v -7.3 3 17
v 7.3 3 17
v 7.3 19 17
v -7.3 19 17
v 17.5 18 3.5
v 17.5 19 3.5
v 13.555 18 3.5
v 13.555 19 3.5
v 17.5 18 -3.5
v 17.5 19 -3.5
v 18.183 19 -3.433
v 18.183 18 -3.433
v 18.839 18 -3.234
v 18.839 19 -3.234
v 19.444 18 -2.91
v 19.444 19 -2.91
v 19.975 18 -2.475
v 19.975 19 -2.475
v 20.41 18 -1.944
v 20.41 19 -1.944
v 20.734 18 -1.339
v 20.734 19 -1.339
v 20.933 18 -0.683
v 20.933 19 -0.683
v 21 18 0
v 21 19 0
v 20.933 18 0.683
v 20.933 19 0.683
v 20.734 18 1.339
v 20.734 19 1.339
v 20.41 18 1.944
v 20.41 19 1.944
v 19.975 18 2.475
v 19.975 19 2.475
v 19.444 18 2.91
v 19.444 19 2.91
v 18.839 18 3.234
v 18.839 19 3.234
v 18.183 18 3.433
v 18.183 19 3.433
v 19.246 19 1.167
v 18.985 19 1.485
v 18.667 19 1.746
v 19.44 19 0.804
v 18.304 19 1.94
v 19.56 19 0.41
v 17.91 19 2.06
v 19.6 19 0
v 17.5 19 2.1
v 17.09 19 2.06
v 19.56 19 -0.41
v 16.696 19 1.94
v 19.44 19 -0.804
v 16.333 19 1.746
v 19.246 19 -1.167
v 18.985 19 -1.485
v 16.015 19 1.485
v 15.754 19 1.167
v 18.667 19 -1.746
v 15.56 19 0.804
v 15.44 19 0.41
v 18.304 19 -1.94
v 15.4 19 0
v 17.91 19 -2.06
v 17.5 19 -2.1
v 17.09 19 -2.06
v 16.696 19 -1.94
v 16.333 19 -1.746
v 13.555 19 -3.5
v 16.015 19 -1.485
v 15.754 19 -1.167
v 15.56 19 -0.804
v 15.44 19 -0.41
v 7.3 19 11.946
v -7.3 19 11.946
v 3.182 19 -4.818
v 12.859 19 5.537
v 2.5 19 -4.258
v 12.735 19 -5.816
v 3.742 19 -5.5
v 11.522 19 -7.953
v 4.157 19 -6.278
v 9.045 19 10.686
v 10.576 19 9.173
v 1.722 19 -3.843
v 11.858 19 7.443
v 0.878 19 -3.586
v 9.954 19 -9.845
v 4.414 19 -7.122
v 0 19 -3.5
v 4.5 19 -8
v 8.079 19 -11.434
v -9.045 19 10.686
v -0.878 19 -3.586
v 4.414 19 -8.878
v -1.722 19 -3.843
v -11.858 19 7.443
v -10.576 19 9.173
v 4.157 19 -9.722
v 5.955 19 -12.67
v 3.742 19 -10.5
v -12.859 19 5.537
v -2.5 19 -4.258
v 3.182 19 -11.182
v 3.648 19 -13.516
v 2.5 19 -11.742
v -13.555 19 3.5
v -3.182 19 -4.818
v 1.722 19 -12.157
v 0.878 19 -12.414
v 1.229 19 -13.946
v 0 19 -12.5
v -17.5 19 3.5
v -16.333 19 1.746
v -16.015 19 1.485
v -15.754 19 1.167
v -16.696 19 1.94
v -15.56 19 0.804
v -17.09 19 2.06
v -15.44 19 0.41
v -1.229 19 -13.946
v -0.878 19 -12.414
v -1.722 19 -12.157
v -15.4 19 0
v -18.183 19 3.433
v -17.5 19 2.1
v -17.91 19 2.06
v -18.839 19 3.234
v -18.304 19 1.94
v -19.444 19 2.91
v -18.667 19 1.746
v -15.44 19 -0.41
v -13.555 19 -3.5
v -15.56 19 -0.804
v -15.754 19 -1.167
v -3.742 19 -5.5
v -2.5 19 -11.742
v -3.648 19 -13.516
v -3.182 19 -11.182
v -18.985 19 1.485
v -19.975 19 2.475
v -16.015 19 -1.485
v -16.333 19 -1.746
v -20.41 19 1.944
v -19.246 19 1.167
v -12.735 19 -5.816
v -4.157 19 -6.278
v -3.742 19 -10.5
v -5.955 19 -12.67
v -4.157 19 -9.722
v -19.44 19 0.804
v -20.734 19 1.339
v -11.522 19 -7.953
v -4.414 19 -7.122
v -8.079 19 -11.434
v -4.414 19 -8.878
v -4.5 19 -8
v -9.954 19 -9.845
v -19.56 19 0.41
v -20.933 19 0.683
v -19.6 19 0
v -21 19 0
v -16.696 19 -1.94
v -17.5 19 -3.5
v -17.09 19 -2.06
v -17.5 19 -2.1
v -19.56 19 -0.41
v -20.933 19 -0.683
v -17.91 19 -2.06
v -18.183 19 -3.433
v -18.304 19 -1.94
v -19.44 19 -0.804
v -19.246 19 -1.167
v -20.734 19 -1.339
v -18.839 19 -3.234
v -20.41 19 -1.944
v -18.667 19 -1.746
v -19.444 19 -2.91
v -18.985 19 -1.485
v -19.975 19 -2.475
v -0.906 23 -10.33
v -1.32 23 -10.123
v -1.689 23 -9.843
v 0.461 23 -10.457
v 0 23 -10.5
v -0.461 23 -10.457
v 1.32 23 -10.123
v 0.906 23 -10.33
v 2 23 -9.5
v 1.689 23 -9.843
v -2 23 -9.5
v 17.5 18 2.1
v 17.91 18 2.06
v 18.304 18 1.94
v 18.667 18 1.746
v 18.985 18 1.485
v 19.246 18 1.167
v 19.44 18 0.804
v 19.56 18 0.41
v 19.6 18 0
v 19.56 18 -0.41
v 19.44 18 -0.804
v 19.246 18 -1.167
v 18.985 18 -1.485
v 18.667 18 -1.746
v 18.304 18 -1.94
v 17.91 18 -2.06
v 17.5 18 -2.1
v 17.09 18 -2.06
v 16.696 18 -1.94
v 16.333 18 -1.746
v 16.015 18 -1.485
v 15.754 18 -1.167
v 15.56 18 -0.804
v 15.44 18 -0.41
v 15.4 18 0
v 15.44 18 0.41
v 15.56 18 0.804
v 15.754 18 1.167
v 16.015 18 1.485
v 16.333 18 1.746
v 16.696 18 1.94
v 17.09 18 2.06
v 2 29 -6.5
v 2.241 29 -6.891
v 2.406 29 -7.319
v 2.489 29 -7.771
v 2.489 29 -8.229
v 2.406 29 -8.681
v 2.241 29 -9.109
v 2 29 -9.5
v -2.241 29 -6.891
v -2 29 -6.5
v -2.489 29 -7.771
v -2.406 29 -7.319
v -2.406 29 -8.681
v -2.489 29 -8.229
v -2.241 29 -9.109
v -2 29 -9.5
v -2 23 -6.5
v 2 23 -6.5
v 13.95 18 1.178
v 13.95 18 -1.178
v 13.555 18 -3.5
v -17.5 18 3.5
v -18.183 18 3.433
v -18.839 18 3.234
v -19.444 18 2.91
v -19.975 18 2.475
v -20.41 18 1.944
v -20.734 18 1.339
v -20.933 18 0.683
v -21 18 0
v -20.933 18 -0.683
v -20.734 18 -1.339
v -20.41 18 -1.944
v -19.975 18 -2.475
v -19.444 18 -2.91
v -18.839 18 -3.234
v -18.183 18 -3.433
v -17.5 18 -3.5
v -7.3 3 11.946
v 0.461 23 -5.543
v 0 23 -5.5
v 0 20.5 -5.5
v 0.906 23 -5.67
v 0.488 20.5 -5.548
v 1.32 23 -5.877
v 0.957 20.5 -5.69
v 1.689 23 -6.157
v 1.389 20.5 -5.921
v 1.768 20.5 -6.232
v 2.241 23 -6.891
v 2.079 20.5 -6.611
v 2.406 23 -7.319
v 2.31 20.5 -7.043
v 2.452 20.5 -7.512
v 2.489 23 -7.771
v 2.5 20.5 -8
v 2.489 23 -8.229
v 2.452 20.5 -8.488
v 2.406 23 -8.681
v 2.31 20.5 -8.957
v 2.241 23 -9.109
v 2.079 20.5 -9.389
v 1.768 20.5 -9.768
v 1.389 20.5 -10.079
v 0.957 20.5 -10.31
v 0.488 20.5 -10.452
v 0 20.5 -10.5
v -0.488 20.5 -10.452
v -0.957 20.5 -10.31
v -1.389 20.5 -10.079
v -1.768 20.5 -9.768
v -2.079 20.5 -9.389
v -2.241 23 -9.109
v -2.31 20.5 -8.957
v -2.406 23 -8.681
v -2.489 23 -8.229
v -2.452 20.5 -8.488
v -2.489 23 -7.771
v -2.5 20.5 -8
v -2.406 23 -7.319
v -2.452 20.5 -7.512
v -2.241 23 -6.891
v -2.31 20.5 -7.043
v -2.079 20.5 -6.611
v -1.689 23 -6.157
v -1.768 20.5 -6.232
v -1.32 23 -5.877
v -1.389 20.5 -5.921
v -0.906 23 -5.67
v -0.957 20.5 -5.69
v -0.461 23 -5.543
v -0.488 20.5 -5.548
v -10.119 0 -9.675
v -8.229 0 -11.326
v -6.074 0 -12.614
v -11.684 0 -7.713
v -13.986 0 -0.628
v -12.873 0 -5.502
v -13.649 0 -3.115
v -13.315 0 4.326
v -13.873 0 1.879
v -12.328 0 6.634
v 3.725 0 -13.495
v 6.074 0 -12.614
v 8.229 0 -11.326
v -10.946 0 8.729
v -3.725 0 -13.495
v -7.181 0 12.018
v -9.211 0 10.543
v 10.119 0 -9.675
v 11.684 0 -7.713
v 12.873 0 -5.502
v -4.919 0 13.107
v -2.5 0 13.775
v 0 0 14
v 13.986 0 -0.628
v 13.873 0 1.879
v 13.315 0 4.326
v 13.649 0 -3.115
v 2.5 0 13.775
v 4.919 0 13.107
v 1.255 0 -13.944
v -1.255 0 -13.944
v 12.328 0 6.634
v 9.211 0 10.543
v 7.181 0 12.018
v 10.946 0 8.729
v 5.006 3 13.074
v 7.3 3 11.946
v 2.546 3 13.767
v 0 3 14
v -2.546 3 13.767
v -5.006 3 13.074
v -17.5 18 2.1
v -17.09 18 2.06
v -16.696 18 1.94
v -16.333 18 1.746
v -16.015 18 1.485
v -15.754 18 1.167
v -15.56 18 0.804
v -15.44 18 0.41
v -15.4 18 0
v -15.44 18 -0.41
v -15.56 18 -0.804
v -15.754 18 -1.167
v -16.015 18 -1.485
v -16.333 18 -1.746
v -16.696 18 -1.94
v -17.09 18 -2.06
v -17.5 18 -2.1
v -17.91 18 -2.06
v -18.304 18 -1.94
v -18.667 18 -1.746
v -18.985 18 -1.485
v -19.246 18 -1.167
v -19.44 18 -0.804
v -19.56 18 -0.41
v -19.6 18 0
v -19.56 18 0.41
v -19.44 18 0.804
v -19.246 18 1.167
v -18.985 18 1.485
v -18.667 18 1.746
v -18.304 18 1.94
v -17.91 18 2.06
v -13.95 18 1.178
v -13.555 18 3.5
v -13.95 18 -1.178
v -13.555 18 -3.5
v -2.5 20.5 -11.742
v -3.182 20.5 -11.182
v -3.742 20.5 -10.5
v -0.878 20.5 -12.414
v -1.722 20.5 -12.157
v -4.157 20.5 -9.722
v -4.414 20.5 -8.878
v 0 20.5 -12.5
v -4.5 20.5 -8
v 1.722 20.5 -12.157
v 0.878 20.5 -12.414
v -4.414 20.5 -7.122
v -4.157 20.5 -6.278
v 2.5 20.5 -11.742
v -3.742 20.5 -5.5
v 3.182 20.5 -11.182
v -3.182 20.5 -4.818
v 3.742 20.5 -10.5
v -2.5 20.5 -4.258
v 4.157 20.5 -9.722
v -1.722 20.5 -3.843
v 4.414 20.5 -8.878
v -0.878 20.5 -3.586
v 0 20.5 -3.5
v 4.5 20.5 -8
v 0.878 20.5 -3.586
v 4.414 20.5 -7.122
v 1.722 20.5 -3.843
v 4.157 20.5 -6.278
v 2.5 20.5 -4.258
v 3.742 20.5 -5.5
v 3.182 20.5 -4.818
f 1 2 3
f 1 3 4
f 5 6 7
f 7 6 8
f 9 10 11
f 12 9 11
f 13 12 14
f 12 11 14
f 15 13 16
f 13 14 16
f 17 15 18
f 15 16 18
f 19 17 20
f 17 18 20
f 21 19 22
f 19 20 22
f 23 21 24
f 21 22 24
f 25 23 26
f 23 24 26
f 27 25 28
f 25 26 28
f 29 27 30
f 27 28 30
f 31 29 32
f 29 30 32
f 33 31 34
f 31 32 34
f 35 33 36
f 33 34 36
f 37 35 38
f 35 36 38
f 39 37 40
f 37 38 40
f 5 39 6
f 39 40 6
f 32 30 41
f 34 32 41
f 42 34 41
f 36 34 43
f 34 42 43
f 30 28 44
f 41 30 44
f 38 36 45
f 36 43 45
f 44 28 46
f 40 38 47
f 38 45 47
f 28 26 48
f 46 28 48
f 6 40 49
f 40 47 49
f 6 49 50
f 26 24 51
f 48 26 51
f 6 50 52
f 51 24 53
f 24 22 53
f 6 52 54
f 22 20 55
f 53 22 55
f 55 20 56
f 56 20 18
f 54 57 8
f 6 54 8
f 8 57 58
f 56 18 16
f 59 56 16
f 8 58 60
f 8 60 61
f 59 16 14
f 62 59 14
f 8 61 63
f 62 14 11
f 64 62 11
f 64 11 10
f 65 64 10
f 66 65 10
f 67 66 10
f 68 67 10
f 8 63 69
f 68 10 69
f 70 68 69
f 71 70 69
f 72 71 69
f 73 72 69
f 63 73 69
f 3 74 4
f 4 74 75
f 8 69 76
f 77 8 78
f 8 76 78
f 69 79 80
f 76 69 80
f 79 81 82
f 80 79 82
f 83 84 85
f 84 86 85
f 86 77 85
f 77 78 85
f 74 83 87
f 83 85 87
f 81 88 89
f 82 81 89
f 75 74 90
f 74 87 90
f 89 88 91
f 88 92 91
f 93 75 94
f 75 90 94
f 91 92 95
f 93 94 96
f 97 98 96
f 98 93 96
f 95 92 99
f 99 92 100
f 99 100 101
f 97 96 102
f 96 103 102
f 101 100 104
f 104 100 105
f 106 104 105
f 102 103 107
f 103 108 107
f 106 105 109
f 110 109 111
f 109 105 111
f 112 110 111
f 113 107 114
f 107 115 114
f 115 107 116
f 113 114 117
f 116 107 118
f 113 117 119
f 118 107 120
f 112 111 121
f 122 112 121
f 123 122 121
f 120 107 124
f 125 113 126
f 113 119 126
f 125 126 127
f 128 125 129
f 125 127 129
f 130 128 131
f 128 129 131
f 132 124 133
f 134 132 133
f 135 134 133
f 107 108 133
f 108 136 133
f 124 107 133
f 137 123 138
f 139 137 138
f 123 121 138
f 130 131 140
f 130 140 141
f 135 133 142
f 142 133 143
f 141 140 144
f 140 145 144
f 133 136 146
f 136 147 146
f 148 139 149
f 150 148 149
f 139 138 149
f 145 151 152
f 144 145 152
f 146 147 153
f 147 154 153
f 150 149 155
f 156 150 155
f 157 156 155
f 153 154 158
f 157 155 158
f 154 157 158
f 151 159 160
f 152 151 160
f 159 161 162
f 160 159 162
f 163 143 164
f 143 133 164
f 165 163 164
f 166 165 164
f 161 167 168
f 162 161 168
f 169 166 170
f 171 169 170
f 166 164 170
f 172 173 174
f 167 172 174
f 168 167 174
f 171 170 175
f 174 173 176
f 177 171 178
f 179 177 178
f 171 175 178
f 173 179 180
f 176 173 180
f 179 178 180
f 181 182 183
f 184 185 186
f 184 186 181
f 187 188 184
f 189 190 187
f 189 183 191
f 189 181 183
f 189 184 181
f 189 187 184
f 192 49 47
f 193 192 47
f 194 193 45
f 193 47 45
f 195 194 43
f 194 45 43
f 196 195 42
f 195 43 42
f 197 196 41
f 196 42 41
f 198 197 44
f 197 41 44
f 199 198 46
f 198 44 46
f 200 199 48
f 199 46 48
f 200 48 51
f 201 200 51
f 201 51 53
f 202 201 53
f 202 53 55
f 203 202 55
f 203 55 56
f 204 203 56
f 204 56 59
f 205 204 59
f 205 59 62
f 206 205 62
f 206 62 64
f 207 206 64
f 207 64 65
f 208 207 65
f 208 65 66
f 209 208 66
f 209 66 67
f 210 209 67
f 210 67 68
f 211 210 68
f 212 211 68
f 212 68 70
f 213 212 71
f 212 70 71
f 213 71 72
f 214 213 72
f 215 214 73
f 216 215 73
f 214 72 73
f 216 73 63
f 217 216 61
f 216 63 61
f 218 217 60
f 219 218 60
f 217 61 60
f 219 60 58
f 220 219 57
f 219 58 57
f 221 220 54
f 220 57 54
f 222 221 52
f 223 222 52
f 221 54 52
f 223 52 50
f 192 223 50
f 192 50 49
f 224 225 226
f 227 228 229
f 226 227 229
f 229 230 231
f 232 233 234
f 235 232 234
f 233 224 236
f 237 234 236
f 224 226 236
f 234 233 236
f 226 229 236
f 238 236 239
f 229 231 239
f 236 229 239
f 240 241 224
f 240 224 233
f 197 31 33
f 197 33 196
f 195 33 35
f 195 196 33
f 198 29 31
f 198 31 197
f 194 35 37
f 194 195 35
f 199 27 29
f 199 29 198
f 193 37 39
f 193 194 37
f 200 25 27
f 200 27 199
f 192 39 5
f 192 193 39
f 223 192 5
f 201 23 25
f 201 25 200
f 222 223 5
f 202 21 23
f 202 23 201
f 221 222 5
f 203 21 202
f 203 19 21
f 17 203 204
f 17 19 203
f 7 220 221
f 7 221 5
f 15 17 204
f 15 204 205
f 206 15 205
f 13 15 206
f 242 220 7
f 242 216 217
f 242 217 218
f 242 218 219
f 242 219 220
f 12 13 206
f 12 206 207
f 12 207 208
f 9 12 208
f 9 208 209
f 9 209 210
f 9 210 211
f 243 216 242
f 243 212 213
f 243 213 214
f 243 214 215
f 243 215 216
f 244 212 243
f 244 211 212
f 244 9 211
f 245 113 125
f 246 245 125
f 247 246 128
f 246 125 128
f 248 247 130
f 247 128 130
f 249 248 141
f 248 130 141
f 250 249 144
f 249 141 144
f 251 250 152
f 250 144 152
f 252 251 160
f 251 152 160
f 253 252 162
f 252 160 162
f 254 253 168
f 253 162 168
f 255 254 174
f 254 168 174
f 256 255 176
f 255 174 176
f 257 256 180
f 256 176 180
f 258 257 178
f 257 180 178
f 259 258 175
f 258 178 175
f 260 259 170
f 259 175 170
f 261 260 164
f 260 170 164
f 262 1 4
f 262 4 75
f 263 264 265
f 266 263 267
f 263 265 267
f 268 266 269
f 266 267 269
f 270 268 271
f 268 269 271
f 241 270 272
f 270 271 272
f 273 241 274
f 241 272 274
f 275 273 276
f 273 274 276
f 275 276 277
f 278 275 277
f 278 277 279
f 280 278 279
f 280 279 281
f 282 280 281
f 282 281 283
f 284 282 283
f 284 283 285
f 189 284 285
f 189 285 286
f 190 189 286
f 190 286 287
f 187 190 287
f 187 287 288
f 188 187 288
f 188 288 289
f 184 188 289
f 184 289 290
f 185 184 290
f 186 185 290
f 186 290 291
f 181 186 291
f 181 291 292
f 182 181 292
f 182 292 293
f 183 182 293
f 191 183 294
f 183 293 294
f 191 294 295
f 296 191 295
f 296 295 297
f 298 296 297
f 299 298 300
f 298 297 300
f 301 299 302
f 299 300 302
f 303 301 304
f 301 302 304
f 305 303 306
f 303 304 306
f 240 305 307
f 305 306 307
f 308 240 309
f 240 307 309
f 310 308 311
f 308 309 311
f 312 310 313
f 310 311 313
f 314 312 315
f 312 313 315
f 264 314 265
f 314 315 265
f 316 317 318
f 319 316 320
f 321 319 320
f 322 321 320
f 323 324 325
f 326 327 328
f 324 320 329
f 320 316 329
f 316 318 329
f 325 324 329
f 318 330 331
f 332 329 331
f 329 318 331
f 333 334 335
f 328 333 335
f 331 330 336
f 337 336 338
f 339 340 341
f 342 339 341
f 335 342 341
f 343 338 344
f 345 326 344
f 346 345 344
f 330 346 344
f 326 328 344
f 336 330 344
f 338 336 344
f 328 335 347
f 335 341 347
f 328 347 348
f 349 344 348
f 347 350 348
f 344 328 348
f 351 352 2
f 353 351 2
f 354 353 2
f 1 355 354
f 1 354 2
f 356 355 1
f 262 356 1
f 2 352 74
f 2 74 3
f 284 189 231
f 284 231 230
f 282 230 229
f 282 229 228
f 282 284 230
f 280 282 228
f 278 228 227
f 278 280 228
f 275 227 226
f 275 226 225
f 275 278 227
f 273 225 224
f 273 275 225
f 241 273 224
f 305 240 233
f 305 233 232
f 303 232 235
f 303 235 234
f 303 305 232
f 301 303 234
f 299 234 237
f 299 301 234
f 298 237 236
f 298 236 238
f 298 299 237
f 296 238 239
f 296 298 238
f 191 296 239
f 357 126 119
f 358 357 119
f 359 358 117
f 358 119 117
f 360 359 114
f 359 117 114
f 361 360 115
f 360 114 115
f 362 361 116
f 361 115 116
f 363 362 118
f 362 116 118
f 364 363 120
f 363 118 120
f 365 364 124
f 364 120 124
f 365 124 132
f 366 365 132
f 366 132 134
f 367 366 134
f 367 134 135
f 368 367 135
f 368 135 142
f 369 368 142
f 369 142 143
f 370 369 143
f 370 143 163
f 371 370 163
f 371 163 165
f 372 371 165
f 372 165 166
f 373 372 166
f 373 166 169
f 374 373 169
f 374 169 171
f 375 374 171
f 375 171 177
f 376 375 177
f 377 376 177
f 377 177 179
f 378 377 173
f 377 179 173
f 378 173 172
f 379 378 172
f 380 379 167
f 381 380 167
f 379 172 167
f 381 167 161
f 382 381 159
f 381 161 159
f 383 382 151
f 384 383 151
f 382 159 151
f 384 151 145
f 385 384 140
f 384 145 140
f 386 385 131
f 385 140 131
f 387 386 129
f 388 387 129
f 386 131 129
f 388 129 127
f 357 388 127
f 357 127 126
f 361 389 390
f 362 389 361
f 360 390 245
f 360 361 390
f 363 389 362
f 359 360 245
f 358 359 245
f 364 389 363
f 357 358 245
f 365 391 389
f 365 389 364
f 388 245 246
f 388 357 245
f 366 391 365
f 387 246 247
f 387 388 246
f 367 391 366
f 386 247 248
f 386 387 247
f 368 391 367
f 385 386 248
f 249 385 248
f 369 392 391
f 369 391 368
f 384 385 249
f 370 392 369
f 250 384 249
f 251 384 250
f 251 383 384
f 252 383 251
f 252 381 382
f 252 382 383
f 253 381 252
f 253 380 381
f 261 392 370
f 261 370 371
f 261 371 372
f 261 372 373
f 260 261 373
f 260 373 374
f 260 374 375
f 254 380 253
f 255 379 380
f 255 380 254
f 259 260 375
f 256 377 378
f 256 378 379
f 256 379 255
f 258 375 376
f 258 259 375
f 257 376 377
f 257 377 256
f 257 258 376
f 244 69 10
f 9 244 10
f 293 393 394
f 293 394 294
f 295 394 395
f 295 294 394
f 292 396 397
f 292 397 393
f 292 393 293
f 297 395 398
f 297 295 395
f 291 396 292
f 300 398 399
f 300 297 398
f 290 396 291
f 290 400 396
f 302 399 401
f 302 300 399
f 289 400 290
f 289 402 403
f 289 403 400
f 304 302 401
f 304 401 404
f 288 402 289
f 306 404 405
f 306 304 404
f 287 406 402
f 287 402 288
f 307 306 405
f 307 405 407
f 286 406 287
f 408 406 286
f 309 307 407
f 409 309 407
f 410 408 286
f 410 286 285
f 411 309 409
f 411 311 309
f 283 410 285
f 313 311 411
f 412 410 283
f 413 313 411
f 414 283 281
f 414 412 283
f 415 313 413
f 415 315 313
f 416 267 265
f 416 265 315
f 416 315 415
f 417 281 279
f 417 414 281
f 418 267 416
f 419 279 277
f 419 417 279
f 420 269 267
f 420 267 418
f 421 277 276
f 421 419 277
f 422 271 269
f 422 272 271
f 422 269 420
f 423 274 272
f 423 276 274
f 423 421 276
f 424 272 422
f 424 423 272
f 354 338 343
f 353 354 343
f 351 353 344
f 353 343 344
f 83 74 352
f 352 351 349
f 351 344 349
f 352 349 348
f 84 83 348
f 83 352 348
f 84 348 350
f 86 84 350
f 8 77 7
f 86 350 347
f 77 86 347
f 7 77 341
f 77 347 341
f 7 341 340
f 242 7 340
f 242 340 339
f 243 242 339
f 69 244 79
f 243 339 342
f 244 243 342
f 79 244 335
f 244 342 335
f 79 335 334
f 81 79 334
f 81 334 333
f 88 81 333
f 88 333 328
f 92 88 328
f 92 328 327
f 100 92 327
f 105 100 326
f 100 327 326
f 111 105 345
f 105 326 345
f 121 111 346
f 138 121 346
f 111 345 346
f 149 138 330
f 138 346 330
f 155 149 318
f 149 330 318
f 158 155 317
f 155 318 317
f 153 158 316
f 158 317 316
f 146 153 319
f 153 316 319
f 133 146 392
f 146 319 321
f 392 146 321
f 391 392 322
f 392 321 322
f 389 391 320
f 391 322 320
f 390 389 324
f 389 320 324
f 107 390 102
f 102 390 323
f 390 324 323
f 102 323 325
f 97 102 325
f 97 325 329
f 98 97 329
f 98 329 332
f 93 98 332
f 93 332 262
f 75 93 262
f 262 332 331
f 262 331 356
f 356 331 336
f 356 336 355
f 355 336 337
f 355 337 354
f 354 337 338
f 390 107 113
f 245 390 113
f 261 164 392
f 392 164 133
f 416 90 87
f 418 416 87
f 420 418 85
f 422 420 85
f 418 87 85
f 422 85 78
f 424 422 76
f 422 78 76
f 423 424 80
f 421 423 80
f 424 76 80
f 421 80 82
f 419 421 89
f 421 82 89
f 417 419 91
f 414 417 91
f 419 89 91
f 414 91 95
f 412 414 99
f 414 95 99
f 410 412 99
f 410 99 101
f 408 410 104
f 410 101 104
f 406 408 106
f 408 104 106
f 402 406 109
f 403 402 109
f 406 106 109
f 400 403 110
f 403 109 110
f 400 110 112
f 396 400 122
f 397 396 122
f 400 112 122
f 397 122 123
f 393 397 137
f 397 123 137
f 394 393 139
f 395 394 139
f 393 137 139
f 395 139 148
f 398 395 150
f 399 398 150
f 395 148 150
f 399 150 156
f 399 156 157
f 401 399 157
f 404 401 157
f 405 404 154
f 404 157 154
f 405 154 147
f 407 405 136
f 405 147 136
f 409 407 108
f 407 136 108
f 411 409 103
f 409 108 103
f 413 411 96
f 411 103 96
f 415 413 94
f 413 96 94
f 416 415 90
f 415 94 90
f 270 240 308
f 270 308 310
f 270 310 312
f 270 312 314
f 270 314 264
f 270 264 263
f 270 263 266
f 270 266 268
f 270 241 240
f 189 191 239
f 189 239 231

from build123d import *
from build123d.topology import SkipClean

# Parameters (mm, degrees)
SKETCH1_R           = 14
BOSS_EXTRUDE1_DEPTH = 19
BOSS_EXTRUDE2_DEPTH = 1
CUT_EXTRUDE1_REACH  = 33.591
SKETCH3_R           = 2.1
BOSS_EXTRUDE3_DEPTH = 16
SKETCH5_R           = 4.5
BOSS_EXTRUDE4_DEPTH = 1.5
SKETCH6_R           = 2.5
BOSS_EXTRUDE5_DEPTH = 2.5
BOSS_EXTRUDE6_DEPTH = 6


with BuildPart() as part:
    # Sketch1 → Boss-Extrude1 (new body)
    with BuildSketch(Plane(origin=(0, 0, 0), x_dir=(1, 0, 0), z_dir=(0, 1, 0))):
        with Locations(Location((0, 0, 0), (0, 0, 270))):
            Circle(SKETCH1_R)
    extrude(amount=BOSS_EXTRUDE1_DEPTH)

    # Sketch2 → Boss-Extrude2 (add)
    with BuildSketch(Plane(origin=(0, 19, 0), x_dir=(1, 0, 0), z_dir=(0, 1, 0))):
        with BuildLine():
            Line((13.555441712, 3.5), (17.5, 3.5))
            ThreePointArc((17.5, 3.5), (21, 0), (17.5, -3.5))
            Line((17.5, -3.5), (13.555441712, -3.5))
            ThreePointArc((13.555441712, -3.5), (14, 0), (13.555441712, 3.5))
        make_face()
        with BuildLine():
            Line((-13.555441712, -3.5), (-17.5, -3.5))
            ThreePointArc((-17.5, -3.5), (-21, 0), (-17.5, 3.5))
            Line((-17.5, 3.5), (-13.555441712, 3.5))
            ThreePointArc((-13.555441712, 3.5), (-14, 0), (-13.555441712, -3.5))
        make_face()
    extrude(amount=-BOSS_EXTRUDE2_DEPTH)

    # Sketch3 → Cut-Extrude1 (cut, up to next)
    with BuildSketch(Plane(origin=(0, 19, 0), x_dir=(1, 0, 0), z_dir=(0, 1, 0)), mode=Mode.PRIVATE) as cut_extrude1_sk1:
        with Locations(Location((17.5, 0, 0), (0, 0, 270))):
            Circle(SKETCH3_R)
    cut_extrude1_tool1 = extrude(cut_extrude1_sk1.sketch, amount=-CUT_EXTRUDE1_REACH, mode=Mode.PRIVATE) & part.part
    # Sketch3 → Cut-Extrude1 (cut, up to next)
    with BuildSketch(Plane(origin=(0, 19, 0), x_dir=(1, 0, 0), z_dir=(0, 1, 0)), mode=Mode.PRIVATE) as cut_extrude1_sk2:
        with Locations(Location((-17.5, 0, 0), (0, 0, 270))):
            Circle(SKETCH3_R)
    cut_extrude1_tool2 = extrude(cut_extrude1_sk2.sketch, amount=-CUT_EXTRUDE1_REACH, mode=Mode.PRIVATE) & part.part
    add(cut_extrude1_tool1.solids().sort_by_distance((17.5, 19, 0))[0], mode=Mode.SUBTRACT)
    add(cut_extrude1_tool2.solids().sort_by_distance((-17.5, 19, 0))[0], mode=Mode.SUBTRACT)

    # Sketch4 → Boss-Extrude3 (add)
    with BuildSketch(Plane(origin=(0, 19, 0), x_dir=(1, 0, 0), z_dir=(0, 1, 0))):
        with BuildLine():
            Line((7.3, -11.94612908), (7.3, -17))
            Line((7.3, -17), (-7.3, -17))
            Line((-7.3, -17), (-7.3, -11.94612908))
            ThreePointArc((-7.3, -11.94612908), (0, -14), (7.3, -11.94612908))
        make_face()
    extrude(amount=-BOSS_EXTRUDE3_DEPTH)

    # Sketch5 → Boss-Extrude4 (add)
    with BuildSketch(Plane(origin=(0, 19, 0), x_dir=(1, 0, 0), z_dir=(0, 1, 0))):
        with Locations(Location((0, 8, 0), (0, 0, 270))):
            Circle(SKETCH5_R)
    extrude(amount=BOSS_EXTRUDE4_DEPTH)

    # Sketch6 → Boss-Extrude5 (add)
    with BuildSketch(Plane(origin=(0, 20.5, 0), x_dir=(1, 0, 0), z_dir=(0, 1, 0))):
        with Locations(Location((0, 8, 0), (0, 0, 270))):
            Circle(SKETCH6_R)
    extrude(amount=BOSS_EXTRUDE5_DEPTH)

    # Sketch7 → Boss-Extrude6 (add)
    with SkipClean():  # the faces are left unmerged after this step: merging them gives an invalid solid
        with BuildSketch(Plane(origin=(0, 23, 0), x_dir=(1, 0, 0), z_dir=(0, 1, 0))):
            with BuildLine():
                Line((-2, 9.5), (2, 9.5))
                ThreePointArc((2, 9.5), (2.5, 8), (2, 6.5))
                Line((2, 6.5), (-2, 6.5))
                ThreePointArc((-2, 6.5), (-2.5, 8), (-2, 9.5))
            make_face()
        extrude(amount=BOSS_EXTRUDE6_DEPTH)


solid = part.part
